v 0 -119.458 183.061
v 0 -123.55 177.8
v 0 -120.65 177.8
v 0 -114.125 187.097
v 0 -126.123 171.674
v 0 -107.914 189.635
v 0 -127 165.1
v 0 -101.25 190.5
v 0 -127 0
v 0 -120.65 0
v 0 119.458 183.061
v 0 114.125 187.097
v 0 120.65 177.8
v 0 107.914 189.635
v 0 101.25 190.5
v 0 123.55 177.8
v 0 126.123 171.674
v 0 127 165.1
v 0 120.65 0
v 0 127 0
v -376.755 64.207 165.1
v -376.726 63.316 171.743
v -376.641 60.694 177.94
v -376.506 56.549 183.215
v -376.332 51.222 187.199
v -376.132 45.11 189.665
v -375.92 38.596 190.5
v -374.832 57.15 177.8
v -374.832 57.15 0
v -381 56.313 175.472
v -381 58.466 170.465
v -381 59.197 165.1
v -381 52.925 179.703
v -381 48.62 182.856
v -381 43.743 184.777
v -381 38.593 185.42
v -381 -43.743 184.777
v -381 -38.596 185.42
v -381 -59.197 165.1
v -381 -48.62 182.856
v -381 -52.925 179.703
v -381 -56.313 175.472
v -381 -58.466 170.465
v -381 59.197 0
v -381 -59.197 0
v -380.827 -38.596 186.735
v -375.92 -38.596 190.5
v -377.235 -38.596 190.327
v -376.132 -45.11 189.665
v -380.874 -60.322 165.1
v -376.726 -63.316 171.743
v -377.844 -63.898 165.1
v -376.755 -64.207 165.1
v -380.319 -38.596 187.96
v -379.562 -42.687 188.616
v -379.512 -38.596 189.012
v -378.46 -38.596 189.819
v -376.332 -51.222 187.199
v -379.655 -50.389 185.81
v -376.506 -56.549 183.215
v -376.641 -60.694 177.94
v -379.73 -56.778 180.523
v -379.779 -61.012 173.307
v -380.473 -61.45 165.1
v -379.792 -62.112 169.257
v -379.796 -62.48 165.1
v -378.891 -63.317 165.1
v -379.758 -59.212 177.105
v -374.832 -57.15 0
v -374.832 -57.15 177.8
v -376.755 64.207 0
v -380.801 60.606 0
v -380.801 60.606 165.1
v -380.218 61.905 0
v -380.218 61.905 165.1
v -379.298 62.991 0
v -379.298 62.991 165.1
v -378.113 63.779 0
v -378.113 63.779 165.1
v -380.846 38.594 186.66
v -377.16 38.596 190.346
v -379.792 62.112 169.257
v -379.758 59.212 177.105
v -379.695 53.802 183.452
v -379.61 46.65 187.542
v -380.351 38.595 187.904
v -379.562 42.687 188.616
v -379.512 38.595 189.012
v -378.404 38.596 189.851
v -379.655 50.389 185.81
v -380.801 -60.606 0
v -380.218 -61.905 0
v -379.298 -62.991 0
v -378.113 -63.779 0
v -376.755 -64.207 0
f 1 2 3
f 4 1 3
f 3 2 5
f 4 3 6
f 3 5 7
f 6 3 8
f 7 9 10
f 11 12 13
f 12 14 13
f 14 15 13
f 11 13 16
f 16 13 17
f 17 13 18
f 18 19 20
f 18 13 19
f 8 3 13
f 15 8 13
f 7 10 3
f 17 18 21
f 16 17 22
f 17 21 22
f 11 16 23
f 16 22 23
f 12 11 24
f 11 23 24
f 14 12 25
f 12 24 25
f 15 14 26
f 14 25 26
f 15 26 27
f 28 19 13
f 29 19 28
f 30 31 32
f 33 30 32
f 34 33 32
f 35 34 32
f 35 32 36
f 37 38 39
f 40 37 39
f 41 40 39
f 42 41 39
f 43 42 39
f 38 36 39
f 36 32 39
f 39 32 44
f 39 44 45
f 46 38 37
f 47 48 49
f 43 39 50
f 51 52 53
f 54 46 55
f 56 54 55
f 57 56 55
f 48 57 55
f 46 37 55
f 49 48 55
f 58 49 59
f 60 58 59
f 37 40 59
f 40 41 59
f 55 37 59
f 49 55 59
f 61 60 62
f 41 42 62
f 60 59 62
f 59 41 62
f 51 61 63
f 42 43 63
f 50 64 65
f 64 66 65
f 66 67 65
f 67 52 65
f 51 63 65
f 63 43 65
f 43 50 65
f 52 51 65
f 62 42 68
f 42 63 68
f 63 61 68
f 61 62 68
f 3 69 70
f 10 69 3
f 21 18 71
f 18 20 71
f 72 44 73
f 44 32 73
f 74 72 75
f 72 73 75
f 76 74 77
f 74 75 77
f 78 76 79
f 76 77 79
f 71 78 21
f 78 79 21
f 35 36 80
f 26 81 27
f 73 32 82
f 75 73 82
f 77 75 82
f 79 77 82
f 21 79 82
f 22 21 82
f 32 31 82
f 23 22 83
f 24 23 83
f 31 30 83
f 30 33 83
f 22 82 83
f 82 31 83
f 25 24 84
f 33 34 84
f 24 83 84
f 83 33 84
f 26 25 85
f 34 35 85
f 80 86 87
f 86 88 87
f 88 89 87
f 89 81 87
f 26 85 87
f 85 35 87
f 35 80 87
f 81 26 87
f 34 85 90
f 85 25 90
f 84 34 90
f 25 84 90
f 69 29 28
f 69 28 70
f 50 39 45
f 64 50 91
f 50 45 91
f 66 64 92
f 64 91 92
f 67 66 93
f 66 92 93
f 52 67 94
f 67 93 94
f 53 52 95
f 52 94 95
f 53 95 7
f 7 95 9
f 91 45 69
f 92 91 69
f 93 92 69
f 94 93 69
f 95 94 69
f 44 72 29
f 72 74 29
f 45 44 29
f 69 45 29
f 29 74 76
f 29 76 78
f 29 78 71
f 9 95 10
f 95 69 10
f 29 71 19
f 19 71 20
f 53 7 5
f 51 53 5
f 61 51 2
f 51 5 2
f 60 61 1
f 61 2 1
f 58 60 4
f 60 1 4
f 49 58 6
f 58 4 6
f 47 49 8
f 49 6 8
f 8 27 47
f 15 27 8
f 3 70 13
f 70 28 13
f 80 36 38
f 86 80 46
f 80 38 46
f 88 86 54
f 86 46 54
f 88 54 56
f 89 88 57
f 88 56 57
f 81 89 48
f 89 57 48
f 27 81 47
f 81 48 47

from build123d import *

# Parameters (mm, degrees)
F1_DEPTH = 190.5
F2_R     = 25.4
F3_R     = 5.08
F5_DEPTH = 177.8


with BuildPart() as f1:
    # F0 (on Top) → F1 (new body)
    with BuildSketch(Plane.XY):
        Polygon((0, 0), (0, 127), (-381, 63.5), (-381, 0), align=None)
        Polygon((0, -127), (0, 0), (-381, 0), (-381, -63.5), align=None)
    extrude(amount=F1_DEPTH)

    # F2
    f2_edges = [f1.edges().sort_by_distance(p)[0] for p in [
        (-190.5, -95.25, 190.5),
        (-190.5, 95.25, 190.5),
    ]]
    fillet(f2_edges, radius=F2_R)

    # F3
    f3_edges = [f1.edges().sort_by_distance(p)[0] for p in [
        (-381, 0, 190.5),
    ]]
    fillet(f3_edges, radius=F3_R)

    # F4 (on Top) → F5 (cut)
    with BuildSketch(Plane.XY):
        Polygon((-374.832104, -57.15), (0, -120.65), (0, 120.65), (-374.832104, 57.15), (-374.832104, 0), align=None)
    extrude(amount=F5_DEPTH, mode=Mode.SUBTRACT)


solid = f1.part
